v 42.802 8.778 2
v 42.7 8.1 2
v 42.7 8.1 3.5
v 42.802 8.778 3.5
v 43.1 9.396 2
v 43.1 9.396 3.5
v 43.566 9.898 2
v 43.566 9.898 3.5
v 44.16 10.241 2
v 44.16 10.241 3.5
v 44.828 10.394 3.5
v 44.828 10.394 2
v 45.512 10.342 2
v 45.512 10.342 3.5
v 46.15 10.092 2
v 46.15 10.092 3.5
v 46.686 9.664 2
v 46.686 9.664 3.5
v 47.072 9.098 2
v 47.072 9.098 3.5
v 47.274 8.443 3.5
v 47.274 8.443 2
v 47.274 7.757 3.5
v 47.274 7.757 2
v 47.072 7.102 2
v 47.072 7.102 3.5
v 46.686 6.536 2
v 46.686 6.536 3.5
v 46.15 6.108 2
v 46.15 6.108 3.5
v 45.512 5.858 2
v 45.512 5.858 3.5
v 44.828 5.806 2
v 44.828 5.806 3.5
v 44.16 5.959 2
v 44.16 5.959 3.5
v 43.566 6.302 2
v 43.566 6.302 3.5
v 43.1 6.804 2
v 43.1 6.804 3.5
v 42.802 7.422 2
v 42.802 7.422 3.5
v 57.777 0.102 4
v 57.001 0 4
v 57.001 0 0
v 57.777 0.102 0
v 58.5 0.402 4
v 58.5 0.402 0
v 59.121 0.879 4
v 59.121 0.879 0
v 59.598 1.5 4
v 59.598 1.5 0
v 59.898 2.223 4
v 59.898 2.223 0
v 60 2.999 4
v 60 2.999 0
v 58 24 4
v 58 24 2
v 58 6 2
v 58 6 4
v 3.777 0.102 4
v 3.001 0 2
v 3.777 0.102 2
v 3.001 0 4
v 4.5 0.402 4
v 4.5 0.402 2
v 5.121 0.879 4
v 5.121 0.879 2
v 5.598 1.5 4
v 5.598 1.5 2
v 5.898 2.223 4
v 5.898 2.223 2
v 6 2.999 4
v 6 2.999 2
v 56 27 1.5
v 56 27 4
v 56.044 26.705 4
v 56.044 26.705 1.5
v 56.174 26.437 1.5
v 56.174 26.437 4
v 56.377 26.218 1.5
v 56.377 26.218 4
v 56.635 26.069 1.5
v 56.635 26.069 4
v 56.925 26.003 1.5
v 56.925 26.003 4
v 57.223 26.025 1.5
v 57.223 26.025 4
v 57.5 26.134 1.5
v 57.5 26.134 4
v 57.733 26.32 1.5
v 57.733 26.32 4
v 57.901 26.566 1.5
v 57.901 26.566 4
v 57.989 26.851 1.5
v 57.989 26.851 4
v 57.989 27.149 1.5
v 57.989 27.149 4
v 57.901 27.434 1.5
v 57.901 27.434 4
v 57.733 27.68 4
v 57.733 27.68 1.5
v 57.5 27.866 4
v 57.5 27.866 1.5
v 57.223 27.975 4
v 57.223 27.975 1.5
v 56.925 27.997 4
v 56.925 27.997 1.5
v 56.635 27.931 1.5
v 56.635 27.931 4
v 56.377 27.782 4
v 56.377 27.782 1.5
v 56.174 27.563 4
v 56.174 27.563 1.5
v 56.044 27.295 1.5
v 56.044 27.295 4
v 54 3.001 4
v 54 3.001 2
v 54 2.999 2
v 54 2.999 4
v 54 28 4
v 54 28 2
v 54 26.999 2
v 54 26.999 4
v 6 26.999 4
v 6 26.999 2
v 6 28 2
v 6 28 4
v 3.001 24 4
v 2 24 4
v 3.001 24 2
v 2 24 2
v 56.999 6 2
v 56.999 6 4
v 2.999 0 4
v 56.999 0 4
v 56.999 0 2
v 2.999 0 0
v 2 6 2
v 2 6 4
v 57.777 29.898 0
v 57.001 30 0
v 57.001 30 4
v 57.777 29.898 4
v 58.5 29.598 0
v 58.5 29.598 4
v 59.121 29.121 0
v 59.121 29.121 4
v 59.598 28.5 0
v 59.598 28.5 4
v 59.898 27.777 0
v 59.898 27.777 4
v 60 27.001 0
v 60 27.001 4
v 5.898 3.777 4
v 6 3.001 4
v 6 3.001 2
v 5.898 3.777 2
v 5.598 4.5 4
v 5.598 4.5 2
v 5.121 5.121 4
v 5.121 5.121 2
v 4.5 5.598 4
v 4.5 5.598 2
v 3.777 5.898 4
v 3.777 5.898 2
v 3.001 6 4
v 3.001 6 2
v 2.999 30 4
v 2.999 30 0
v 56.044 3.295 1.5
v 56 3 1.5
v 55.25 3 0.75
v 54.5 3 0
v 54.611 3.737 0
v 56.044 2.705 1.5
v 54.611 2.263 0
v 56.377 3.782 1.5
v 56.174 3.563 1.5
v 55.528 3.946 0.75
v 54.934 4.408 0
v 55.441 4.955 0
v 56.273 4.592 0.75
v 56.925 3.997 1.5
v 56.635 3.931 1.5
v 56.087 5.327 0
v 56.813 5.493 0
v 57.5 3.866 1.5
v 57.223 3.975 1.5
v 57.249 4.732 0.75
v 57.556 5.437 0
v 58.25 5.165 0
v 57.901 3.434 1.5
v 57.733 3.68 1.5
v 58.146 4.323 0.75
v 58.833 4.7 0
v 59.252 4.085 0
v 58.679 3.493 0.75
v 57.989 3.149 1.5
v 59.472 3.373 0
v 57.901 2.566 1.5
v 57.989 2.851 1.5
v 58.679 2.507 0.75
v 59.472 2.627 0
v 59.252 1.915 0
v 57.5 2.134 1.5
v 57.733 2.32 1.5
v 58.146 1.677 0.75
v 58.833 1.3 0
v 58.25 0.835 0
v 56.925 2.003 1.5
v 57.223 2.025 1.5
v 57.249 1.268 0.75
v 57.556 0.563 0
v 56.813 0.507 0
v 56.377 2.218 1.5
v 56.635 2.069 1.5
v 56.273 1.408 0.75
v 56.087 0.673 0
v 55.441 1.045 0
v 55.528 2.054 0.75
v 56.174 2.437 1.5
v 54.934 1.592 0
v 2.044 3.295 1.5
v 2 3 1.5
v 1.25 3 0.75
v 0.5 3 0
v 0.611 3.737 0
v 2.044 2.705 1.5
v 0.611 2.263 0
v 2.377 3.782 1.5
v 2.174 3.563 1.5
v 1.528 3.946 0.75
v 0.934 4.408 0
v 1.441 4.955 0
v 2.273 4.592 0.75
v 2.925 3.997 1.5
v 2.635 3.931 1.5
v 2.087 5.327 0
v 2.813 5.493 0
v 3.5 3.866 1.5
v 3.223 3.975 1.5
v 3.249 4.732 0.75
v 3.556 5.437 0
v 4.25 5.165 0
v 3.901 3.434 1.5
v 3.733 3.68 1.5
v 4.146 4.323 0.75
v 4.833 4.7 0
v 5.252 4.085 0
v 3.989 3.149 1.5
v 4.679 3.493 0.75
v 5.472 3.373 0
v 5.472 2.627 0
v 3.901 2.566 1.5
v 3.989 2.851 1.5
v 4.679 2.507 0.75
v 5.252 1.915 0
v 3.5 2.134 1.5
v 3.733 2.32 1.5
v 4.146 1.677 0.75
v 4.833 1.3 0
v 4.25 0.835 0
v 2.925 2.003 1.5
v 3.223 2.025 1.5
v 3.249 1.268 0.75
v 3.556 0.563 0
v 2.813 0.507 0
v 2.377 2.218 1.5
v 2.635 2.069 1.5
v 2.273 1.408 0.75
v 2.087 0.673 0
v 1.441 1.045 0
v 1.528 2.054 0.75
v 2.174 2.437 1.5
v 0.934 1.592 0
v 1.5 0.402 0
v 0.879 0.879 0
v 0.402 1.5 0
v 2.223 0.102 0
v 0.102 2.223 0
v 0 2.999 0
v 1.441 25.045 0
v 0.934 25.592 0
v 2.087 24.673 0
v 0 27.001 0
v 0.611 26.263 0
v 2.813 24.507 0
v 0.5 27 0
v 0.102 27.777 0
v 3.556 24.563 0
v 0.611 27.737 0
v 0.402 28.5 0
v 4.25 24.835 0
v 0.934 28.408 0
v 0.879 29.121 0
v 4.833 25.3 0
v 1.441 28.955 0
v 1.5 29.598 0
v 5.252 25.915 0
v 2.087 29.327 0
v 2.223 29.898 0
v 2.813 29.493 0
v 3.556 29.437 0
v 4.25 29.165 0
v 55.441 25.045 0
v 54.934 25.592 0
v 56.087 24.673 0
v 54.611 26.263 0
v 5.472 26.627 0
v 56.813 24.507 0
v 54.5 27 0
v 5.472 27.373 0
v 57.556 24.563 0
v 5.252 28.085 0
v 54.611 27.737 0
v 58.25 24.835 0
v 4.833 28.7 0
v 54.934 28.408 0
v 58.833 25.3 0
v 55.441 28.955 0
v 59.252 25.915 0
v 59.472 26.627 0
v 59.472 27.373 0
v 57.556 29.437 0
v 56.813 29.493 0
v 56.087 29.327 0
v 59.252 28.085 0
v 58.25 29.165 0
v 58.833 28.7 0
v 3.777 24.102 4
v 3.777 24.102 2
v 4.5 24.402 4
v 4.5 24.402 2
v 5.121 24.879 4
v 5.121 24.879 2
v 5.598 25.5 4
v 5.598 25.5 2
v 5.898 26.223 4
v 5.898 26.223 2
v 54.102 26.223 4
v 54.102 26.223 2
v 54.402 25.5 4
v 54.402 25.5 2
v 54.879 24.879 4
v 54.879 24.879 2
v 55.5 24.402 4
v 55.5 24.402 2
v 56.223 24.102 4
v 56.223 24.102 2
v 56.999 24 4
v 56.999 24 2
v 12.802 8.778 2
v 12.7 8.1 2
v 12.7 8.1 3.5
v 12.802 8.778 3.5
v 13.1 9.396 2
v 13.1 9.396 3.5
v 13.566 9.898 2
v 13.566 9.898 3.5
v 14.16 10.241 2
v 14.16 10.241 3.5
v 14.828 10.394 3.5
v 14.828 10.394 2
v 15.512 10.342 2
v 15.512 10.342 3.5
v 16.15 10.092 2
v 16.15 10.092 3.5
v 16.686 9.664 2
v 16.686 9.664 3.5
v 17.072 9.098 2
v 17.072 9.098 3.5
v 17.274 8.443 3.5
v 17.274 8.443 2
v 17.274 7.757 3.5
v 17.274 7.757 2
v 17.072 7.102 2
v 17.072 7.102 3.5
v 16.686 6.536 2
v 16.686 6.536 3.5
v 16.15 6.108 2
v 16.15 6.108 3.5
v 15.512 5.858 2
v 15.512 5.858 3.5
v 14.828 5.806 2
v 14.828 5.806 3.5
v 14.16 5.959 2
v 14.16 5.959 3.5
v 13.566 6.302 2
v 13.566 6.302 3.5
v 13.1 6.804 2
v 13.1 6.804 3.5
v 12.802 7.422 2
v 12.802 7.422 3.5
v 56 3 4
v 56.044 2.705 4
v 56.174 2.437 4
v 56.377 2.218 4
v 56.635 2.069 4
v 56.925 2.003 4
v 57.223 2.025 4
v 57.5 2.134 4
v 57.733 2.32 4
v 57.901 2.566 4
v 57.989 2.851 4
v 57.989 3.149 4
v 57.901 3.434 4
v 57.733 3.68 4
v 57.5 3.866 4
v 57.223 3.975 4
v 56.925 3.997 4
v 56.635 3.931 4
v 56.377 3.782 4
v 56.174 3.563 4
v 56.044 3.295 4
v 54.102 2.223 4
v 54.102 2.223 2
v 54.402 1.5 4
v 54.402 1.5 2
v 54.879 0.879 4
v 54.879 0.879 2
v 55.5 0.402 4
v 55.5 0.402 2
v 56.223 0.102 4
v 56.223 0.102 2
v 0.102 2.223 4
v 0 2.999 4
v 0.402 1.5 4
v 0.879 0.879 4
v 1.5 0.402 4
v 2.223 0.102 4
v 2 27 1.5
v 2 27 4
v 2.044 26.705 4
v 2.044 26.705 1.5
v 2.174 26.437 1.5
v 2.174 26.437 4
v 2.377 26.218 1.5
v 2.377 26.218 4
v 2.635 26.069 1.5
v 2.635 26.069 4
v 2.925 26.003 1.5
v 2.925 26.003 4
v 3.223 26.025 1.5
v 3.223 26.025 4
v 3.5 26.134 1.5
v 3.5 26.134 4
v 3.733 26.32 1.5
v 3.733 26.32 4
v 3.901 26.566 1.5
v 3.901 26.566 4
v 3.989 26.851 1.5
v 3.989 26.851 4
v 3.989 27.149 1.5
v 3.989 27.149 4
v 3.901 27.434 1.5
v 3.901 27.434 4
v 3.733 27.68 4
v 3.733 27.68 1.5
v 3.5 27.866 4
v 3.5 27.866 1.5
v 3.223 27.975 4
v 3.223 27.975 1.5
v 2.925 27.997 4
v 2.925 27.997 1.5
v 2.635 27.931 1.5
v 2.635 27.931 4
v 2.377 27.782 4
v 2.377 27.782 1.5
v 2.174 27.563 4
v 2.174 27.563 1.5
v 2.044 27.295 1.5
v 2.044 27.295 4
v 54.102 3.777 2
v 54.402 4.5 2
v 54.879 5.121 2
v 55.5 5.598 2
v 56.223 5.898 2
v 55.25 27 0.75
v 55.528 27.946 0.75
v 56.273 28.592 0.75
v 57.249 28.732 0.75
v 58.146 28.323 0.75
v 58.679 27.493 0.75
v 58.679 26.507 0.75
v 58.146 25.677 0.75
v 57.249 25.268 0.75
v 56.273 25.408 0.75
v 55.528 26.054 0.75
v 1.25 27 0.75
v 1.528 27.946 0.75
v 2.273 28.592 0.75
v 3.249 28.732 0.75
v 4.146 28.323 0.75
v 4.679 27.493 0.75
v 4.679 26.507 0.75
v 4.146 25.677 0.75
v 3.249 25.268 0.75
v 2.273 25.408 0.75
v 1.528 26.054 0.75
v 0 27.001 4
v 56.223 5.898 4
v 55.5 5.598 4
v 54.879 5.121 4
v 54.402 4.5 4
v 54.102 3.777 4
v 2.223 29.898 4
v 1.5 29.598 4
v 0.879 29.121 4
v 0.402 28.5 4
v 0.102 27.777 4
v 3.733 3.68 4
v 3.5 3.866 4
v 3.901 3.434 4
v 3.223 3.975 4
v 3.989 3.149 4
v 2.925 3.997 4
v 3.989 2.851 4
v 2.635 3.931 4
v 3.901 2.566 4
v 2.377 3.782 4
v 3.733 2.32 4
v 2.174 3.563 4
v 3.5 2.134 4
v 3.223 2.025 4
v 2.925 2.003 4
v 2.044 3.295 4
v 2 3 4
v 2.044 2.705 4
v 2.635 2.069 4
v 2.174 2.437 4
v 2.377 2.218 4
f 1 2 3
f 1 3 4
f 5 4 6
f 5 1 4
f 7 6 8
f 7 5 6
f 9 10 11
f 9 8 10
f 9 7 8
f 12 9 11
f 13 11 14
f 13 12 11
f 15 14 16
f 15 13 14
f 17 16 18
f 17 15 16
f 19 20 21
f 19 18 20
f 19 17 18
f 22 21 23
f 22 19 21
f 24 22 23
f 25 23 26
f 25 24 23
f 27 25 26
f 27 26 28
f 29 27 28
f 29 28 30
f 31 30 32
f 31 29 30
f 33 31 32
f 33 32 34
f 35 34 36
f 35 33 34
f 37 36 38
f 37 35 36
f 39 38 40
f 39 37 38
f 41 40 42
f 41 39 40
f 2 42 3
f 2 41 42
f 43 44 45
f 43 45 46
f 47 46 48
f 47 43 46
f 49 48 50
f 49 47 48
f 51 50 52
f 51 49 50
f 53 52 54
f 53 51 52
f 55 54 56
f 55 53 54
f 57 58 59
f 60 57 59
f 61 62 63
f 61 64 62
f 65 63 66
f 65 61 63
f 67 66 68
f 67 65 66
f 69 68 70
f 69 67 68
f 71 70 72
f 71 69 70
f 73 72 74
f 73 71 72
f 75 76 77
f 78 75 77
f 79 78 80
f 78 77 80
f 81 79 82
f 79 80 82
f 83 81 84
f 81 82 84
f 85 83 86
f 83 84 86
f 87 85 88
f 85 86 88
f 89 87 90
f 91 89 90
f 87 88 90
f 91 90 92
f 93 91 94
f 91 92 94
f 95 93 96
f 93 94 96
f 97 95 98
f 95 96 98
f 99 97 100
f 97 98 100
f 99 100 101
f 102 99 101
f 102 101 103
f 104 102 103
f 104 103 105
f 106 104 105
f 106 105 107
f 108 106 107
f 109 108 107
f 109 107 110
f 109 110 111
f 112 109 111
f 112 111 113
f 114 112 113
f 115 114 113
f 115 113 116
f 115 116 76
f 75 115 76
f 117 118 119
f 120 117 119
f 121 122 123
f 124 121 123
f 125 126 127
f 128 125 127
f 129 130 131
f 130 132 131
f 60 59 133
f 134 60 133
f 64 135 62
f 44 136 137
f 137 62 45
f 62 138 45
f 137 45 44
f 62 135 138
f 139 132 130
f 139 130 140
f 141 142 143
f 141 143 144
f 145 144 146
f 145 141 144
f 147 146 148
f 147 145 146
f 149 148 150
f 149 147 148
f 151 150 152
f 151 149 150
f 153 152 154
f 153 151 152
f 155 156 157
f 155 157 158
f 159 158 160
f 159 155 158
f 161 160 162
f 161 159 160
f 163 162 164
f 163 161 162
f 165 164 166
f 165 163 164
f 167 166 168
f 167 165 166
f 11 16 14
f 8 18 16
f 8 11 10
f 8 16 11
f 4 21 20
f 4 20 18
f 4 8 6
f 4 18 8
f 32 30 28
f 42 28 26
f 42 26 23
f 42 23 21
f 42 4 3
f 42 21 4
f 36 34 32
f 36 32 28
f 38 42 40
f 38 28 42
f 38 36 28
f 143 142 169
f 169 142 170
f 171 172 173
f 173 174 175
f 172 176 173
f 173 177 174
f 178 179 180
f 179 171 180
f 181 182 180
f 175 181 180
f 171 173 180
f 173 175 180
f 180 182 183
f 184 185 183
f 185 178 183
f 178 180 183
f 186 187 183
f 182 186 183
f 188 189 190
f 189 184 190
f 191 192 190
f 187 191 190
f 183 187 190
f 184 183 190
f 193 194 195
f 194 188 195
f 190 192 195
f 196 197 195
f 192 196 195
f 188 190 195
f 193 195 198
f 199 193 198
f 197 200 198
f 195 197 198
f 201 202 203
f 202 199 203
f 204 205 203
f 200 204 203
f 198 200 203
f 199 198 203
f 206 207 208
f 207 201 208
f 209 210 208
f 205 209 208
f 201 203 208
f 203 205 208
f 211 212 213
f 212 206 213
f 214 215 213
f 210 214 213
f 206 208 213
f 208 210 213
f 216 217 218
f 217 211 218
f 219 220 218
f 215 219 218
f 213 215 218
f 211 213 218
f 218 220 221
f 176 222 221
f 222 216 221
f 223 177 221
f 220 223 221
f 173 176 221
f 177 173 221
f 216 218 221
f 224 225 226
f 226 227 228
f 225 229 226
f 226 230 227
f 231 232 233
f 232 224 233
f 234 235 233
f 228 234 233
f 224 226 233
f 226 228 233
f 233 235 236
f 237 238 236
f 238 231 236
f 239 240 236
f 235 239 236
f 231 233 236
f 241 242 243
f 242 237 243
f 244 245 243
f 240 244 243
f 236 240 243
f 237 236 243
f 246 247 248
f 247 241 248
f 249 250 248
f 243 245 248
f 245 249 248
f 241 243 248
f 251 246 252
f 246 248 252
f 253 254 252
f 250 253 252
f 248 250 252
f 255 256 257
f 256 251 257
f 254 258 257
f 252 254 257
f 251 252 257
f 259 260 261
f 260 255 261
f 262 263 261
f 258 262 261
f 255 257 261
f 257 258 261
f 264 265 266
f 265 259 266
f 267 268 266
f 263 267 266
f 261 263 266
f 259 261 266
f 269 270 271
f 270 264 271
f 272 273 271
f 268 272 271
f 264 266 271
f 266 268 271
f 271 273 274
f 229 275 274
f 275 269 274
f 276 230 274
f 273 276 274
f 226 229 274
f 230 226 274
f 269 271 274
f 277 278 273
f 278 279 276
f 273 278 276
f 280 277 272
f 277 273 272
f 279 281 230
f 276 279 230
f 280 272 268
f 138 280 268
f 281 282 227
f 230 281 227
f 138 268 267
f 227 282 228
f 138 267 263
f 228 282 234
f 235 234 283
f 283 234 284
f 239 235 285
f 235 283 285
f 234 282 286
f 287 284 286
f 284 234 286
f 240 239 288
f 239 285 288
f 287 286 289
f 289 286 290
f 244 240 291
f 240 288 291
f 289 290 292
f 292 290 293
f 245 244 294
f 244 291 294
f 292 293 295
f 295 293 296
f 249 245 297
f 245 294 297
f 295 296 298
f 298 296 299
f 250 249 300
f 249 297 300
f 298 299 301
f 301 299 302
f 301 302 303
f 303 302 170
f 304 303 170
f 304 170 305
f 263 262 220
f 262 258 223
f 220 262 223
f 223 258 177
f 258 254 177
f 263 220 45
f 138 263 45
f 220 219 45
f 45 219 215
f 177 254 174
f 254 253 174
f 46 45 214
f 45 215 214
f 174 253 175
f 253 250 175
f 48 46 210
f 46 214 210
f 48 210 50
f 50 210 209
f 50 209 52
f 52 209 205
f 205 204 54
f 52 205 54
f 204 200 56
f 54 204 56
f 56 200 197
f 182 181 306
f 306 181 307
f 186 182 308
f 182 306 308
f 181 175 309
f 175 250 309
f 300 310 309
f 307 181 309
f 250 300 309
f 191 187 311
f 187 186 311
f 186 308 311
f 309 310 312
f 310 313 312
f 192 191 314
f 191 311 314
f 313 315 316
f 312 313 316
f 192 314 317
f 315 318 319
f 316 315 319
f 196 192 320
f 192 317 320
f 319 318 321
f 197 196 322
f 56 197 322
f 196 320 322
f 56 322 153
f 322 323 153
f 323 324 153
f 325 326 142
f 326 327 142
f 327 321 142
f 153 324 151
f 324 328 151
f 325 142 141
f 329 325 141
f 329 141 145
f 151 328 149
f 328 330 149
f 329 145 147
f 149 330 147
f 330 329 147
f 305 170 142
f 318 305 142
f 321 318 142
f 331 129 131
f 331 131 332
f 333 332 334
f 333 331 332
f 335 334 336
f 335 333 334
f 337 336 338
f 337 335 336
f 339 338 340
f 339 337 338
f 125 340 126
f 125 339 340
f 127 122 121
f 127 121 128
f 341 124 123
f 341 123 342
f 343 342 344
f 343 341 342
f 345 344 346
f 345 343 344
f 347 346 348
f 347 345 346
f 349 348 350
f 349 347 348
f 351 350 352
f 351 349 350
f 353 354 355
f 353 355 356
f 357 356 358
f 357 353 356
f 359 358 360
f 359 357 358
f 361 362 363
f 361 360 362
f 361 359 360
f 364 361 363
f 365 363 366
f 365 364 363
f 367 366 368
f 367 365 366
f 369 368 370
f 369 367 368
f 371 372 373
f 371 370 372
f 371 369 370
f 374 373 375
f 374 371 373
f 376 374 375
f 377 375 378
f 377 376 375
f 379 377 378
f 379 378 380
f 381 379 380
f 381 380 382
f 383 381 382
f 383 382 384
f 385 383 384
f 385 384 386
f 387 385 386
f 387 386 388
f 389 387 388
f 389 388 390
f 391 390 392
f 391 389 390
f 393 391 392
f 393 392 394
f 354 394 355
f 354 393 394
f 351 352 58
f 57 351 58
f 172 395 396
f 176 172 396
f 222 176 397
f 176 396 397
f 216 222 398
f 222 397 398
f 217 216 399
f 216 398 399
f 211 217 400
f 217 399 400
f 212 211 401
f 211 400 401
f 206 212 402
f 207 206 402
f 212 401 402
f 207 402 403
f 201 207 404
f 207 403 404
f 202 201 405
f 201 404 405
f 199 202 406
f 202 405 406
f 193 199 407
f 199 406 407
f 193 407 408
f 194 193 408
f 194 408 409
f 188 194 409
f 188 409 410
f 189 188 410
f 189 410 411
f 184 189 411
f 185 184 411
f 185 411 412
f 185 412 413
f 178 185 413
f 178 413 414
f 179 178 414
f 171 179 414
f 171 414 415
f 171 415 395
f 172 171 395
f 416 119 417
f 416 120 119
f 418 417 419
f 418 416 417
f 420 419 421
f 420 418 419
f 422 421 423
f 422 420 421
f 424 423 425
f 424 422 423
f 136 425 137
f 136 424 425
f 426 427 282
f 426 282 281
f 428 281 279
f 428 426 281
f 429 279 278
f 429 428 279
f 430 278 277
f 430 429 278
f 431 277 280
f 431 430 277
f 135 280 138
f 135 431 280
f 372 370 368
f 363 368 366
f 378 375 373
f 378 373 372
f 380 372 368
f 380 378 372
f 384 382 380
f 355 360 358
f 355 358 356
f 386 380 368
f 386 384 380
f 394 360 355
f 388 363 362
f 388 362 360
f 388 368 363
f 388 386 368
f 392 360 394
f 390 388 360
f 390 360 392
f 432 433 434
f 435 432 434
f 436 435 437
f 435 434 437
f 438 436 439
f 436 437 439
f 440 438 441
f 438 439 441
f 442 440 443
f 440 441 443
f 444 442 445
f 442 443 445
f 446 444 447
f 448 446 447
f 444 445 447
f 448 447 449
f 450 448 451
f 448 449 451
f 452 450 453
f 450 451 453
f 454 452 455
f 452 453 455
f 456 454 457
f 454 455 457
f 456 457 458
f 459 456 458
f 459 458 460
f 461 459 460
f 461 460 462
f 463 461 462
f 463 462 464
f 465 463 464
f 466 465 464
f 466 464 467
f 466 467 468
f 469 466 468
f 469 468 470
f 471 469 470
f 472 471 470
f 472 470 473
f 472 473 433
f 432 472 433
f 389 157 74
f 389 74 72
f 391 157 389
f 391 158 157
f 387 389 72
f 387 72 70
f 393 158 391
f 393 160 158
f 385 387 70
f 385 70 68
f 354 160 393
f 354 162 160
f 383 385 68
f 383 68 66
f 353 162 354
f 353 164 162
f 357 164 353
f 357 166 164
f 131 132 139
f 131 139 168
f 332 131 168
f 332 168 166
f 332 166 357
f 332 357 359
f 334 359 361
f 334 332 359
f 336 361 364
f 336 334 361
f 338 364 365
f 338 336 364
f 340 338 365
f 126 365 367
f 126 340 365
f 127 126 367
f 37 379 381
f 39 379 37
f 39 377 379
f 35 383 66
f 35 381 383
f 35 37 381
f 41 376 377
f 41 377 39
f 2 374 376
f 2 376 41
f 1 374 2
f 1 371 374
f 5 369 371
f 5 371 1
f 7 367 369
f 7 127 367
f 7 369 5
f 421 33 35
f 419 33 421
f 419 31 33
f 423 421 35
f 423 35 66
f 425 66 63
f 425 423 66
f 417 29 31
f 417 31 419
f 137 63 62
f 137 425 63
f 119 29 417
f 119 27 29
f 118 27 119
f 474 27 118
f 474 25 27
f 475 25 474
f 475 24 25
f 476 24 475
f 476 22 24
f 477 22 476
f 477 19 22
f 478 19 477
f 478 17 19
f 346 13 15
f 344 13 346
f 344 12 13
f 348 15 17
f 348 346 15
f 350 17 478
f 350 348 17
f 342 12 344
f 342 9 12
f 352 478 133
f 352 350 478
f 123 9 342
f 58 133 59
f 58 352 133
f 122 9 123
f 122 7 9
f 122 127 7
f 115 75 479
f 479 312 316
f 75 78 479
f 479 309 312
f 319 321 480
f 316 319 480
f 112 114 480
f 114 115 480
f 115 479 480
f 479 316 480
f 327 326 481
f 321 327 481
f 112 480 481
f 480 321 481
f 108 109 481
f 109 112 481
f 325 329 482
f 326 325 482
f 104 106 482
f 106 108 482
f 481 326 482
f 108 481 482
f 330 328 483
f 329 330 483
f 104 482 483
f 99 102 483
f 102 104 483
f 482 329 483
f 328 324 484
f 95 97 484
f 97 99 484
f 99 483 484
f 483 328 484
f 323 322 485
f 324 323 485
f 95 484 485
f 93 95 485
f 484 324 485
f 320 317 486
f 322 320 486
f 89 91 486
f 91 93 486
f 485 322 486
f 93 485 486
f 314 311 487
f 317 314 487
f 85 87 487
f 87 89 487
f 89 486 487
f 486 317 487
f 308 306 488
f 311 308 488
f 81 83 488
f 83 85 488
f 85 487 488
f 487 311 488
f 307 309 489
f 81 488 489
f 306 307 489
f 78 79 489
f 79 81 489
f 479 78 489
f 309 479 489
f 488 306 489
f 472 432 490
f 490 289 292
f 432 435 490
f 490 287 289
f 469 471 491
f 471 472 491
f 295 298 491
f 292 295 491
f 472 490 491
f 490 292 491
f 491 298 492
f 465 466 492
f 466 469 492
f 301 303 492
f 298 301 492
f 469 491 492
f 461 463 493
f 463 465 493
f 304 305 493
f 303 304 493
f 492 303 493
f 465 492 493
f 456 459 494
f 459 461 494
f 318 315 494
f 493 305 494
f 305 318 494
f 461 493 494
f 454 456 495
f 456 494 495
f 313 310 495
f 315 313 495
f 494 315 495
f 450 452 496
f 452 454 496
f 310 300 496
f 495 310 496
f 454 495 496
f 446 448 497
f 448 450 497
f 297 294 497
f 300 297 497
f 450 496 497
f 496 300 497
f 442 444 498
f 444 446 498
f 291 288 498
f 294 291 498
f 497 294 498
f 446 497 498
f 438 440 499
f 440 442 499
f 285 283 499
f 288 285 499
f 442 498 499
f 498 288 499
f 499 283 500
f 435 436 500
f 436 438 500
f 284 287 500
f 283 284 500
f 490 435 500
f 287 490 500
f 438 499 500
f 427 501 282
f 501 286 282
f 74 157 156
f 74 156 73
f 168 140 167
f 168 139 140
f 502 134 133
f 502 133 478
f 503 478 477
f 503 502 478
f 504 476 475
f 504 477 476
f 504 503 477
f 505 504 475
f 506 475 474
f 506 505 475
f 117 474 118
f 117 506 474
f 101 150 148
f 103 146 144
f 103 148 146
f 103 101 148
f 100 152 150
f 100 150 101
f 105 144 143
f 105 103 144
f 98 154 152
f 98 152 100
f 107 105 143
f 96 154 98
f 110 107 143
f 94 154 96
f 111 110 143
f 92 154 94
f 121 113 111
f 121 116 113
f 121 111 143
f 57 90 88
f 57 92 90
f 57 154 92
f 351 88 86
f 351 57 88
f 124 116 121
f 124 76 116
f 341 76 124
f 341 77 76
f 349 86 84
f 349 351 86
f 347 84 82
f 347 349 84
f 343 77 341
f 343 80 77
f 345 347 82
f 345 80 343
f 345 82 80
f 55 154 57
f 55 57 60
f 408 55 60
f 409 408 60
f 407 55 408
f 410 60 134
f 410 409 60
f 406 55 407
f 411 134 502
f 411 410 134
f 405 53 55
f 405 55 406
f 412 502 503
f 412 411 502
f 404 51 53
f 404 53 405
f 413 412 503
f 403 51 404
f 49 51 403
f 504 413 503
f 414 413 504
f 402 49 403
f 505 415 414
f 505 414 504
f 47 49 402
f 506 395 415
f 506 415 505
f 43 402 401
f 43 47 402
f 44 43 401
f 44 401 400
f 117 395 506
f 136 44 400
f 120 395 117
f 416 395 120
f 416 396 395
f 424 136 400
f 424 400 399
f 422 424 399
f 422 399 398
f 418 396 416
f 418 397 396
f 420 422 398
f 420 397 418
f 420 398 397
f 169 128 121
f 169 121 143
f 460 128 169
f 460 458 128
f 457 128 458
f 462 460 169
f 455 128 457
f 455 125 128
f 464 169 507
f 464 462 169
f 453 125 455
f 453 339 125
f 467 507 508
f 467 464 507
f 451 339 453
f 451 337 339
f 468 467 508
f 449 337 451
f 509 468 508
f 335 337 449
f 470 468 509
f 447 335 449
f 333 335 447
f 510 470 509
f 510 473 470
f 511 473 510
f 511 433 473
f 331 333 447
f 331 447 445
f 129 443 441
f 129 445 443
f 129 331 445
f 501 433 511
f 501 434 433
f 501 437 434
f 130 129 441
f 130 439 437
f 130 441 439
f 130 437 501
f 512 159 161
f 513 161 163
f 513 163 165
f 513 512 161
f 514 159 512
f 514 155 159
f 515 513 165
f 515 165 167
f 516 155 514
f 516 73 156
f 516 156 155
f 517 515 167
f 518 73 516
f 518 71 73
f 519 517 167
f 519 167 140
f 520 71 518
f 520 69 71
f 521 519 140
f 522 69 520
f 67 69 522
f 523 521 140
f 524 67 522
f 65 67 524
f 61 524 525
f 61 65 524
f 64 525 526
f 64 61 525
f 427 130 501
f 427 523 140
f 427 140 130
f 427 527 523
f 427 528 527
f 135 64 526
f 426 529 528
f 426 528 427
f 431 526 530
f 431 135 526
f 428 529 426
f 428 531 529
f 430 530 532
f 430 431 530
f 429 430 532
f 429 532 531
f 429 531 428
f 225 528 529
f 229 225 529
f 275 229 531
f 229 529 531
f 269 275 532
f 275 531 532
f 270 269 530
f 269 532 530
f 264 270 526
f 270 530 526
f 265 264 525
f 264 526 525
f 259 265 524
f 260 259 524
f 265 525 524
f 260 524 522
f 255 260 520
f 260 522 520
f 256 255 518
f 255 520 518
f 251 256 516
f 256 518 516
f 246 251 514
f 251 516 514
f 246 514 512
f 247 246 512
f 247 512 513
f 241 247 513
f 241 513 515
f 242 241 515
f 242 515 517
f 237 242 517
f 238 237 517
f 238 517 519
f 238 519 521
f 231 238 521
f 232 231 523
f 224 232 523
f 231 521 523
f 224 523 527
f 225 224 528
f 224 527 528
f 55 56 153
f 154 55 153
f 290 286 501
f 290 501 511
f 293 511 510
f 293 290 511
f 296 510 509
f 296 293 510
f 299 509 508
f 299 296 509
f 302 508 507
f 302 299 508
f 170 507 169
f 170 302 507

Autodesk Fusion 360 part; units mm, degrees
sketch "스케치1" plane through (0, 0, 0) normal (0, 0, 1) x (1, 0, 0)
  line L0 (0, 0) -> (60, 0)
  line L1 (60, 0) -> (60, 30)
  line L2 (60, 30) -> (0, 30)
  line L3 (0, 30) -> (0, 0)
  dimension "d1" = 60
  dimension "d2" = 30
extrude "돌출1" add sketch "스케치1" along normal blind 2
sketch "스케치5" plane through (0, 0, 2) normal (0, 0, 1) x (-1, 0, 0)
  line L0 (0, -30) -> (0, 0)
  line L1 (0, 0) -> (0, -30)
  line L2 (-60, -30) -> (0, -30)
  line L3 (-60, -30) -> (-60, 0)
  line L4 (0, 0) -> (-60, 0)
  line L5 (-60, 0) -> (-54, 0)
  line L6 (-54, -28) -> (-6, -28)
  line L7 (-2, -24) -> (-2, -6)
  line L8 (-6, 0) -> (0, 0)
  line L9 (-58, -24) -> (-58, -6)
  line L10 (-2, -24) -> (-6, -24)
  line L11 (-6, -24) -> (-6, -28)
  line L12 (-54, -28) -> (-54, -24)
  line L13 (-54, -24) -> (-58, -24)
  line L14 (-2, -6) -> (-6, -6)
  line L15 (0, 0) -> (-60, 0)
  line L16 (-6, -6) -> (-6, 0)
  line L17 (-58, -6) -> (-54, -6)
  line L18 (-54, -6) -> (-54, 0)
  point P0 (0, -30)
  point P1 (-60, -30)
  point P2 (-60, 0)
  dimension "d38" = 2
  dimension "d39" = 2
  dimension "d42" = 2
  dimension "d43" = 6
  dimension "d44" = 6
  dimension "d45" = 6
  dimension "d46" = 6
  dimension "d47" = 6
extrude "돌출11" add sketch "스케치5" along normal blind 2 contours L0 L1 L2 L3 L4 L5 L6 L7 L8 L9 L10 L11 L12 L13 L14 L15 L16 L17 L18
sketch "스케치10" plane through (0, 0, 4) normal (0, 0, 1) x (-1, 0, 0)
  circle A0 centre (-57, -3) radius 1
  circle A1 centre (-57, -27) radius 1
  circle A2 centre (-3, -3) radius 1
  circle A3 centre (-3, -27) radius 1
  dimension "d82" = 2
  dimension "d83" = 3
  dimension "d84" = 3
  dimension "d85" = 24
  dimension "d86" = 54
extrude "돌출13" cut sketch "스케치10" against normal blind 4
fillet "필렛4" radius 3 10 edges at (0, 0, 2) (60, 0, 2) (0, 30, 2) (60, 30, 2) (54, 24, 3) (6, 24, 3) (6, 6, 3) (54, 6, 3) (6, 0, 3) (54, 0, 3)
chamfer "챔퍼1" distance 1.5 angle 45 4 edges at (57.9323, 3.3616, 0) (57.9323, 27.3616, 0) (3.9323, 27.3616, 0) (3.9323, 3.3616, 0)
sketch "스케치11" plane through (0, 0, 2) normal (0, 0, 1) x (-1, 0, 0)
  circle A0 centre (-45, -8.1) radius 2.3
  circle A1 centre (-15, -8.1) radius 2.3
  dimension "d93" = 8.1
  dimension "d95" = 4.6
  dimension "d98" = 15
  dimension "d99" = 30
extrude "돌출14" add sketch "스케치11" along normal blind 1.5
